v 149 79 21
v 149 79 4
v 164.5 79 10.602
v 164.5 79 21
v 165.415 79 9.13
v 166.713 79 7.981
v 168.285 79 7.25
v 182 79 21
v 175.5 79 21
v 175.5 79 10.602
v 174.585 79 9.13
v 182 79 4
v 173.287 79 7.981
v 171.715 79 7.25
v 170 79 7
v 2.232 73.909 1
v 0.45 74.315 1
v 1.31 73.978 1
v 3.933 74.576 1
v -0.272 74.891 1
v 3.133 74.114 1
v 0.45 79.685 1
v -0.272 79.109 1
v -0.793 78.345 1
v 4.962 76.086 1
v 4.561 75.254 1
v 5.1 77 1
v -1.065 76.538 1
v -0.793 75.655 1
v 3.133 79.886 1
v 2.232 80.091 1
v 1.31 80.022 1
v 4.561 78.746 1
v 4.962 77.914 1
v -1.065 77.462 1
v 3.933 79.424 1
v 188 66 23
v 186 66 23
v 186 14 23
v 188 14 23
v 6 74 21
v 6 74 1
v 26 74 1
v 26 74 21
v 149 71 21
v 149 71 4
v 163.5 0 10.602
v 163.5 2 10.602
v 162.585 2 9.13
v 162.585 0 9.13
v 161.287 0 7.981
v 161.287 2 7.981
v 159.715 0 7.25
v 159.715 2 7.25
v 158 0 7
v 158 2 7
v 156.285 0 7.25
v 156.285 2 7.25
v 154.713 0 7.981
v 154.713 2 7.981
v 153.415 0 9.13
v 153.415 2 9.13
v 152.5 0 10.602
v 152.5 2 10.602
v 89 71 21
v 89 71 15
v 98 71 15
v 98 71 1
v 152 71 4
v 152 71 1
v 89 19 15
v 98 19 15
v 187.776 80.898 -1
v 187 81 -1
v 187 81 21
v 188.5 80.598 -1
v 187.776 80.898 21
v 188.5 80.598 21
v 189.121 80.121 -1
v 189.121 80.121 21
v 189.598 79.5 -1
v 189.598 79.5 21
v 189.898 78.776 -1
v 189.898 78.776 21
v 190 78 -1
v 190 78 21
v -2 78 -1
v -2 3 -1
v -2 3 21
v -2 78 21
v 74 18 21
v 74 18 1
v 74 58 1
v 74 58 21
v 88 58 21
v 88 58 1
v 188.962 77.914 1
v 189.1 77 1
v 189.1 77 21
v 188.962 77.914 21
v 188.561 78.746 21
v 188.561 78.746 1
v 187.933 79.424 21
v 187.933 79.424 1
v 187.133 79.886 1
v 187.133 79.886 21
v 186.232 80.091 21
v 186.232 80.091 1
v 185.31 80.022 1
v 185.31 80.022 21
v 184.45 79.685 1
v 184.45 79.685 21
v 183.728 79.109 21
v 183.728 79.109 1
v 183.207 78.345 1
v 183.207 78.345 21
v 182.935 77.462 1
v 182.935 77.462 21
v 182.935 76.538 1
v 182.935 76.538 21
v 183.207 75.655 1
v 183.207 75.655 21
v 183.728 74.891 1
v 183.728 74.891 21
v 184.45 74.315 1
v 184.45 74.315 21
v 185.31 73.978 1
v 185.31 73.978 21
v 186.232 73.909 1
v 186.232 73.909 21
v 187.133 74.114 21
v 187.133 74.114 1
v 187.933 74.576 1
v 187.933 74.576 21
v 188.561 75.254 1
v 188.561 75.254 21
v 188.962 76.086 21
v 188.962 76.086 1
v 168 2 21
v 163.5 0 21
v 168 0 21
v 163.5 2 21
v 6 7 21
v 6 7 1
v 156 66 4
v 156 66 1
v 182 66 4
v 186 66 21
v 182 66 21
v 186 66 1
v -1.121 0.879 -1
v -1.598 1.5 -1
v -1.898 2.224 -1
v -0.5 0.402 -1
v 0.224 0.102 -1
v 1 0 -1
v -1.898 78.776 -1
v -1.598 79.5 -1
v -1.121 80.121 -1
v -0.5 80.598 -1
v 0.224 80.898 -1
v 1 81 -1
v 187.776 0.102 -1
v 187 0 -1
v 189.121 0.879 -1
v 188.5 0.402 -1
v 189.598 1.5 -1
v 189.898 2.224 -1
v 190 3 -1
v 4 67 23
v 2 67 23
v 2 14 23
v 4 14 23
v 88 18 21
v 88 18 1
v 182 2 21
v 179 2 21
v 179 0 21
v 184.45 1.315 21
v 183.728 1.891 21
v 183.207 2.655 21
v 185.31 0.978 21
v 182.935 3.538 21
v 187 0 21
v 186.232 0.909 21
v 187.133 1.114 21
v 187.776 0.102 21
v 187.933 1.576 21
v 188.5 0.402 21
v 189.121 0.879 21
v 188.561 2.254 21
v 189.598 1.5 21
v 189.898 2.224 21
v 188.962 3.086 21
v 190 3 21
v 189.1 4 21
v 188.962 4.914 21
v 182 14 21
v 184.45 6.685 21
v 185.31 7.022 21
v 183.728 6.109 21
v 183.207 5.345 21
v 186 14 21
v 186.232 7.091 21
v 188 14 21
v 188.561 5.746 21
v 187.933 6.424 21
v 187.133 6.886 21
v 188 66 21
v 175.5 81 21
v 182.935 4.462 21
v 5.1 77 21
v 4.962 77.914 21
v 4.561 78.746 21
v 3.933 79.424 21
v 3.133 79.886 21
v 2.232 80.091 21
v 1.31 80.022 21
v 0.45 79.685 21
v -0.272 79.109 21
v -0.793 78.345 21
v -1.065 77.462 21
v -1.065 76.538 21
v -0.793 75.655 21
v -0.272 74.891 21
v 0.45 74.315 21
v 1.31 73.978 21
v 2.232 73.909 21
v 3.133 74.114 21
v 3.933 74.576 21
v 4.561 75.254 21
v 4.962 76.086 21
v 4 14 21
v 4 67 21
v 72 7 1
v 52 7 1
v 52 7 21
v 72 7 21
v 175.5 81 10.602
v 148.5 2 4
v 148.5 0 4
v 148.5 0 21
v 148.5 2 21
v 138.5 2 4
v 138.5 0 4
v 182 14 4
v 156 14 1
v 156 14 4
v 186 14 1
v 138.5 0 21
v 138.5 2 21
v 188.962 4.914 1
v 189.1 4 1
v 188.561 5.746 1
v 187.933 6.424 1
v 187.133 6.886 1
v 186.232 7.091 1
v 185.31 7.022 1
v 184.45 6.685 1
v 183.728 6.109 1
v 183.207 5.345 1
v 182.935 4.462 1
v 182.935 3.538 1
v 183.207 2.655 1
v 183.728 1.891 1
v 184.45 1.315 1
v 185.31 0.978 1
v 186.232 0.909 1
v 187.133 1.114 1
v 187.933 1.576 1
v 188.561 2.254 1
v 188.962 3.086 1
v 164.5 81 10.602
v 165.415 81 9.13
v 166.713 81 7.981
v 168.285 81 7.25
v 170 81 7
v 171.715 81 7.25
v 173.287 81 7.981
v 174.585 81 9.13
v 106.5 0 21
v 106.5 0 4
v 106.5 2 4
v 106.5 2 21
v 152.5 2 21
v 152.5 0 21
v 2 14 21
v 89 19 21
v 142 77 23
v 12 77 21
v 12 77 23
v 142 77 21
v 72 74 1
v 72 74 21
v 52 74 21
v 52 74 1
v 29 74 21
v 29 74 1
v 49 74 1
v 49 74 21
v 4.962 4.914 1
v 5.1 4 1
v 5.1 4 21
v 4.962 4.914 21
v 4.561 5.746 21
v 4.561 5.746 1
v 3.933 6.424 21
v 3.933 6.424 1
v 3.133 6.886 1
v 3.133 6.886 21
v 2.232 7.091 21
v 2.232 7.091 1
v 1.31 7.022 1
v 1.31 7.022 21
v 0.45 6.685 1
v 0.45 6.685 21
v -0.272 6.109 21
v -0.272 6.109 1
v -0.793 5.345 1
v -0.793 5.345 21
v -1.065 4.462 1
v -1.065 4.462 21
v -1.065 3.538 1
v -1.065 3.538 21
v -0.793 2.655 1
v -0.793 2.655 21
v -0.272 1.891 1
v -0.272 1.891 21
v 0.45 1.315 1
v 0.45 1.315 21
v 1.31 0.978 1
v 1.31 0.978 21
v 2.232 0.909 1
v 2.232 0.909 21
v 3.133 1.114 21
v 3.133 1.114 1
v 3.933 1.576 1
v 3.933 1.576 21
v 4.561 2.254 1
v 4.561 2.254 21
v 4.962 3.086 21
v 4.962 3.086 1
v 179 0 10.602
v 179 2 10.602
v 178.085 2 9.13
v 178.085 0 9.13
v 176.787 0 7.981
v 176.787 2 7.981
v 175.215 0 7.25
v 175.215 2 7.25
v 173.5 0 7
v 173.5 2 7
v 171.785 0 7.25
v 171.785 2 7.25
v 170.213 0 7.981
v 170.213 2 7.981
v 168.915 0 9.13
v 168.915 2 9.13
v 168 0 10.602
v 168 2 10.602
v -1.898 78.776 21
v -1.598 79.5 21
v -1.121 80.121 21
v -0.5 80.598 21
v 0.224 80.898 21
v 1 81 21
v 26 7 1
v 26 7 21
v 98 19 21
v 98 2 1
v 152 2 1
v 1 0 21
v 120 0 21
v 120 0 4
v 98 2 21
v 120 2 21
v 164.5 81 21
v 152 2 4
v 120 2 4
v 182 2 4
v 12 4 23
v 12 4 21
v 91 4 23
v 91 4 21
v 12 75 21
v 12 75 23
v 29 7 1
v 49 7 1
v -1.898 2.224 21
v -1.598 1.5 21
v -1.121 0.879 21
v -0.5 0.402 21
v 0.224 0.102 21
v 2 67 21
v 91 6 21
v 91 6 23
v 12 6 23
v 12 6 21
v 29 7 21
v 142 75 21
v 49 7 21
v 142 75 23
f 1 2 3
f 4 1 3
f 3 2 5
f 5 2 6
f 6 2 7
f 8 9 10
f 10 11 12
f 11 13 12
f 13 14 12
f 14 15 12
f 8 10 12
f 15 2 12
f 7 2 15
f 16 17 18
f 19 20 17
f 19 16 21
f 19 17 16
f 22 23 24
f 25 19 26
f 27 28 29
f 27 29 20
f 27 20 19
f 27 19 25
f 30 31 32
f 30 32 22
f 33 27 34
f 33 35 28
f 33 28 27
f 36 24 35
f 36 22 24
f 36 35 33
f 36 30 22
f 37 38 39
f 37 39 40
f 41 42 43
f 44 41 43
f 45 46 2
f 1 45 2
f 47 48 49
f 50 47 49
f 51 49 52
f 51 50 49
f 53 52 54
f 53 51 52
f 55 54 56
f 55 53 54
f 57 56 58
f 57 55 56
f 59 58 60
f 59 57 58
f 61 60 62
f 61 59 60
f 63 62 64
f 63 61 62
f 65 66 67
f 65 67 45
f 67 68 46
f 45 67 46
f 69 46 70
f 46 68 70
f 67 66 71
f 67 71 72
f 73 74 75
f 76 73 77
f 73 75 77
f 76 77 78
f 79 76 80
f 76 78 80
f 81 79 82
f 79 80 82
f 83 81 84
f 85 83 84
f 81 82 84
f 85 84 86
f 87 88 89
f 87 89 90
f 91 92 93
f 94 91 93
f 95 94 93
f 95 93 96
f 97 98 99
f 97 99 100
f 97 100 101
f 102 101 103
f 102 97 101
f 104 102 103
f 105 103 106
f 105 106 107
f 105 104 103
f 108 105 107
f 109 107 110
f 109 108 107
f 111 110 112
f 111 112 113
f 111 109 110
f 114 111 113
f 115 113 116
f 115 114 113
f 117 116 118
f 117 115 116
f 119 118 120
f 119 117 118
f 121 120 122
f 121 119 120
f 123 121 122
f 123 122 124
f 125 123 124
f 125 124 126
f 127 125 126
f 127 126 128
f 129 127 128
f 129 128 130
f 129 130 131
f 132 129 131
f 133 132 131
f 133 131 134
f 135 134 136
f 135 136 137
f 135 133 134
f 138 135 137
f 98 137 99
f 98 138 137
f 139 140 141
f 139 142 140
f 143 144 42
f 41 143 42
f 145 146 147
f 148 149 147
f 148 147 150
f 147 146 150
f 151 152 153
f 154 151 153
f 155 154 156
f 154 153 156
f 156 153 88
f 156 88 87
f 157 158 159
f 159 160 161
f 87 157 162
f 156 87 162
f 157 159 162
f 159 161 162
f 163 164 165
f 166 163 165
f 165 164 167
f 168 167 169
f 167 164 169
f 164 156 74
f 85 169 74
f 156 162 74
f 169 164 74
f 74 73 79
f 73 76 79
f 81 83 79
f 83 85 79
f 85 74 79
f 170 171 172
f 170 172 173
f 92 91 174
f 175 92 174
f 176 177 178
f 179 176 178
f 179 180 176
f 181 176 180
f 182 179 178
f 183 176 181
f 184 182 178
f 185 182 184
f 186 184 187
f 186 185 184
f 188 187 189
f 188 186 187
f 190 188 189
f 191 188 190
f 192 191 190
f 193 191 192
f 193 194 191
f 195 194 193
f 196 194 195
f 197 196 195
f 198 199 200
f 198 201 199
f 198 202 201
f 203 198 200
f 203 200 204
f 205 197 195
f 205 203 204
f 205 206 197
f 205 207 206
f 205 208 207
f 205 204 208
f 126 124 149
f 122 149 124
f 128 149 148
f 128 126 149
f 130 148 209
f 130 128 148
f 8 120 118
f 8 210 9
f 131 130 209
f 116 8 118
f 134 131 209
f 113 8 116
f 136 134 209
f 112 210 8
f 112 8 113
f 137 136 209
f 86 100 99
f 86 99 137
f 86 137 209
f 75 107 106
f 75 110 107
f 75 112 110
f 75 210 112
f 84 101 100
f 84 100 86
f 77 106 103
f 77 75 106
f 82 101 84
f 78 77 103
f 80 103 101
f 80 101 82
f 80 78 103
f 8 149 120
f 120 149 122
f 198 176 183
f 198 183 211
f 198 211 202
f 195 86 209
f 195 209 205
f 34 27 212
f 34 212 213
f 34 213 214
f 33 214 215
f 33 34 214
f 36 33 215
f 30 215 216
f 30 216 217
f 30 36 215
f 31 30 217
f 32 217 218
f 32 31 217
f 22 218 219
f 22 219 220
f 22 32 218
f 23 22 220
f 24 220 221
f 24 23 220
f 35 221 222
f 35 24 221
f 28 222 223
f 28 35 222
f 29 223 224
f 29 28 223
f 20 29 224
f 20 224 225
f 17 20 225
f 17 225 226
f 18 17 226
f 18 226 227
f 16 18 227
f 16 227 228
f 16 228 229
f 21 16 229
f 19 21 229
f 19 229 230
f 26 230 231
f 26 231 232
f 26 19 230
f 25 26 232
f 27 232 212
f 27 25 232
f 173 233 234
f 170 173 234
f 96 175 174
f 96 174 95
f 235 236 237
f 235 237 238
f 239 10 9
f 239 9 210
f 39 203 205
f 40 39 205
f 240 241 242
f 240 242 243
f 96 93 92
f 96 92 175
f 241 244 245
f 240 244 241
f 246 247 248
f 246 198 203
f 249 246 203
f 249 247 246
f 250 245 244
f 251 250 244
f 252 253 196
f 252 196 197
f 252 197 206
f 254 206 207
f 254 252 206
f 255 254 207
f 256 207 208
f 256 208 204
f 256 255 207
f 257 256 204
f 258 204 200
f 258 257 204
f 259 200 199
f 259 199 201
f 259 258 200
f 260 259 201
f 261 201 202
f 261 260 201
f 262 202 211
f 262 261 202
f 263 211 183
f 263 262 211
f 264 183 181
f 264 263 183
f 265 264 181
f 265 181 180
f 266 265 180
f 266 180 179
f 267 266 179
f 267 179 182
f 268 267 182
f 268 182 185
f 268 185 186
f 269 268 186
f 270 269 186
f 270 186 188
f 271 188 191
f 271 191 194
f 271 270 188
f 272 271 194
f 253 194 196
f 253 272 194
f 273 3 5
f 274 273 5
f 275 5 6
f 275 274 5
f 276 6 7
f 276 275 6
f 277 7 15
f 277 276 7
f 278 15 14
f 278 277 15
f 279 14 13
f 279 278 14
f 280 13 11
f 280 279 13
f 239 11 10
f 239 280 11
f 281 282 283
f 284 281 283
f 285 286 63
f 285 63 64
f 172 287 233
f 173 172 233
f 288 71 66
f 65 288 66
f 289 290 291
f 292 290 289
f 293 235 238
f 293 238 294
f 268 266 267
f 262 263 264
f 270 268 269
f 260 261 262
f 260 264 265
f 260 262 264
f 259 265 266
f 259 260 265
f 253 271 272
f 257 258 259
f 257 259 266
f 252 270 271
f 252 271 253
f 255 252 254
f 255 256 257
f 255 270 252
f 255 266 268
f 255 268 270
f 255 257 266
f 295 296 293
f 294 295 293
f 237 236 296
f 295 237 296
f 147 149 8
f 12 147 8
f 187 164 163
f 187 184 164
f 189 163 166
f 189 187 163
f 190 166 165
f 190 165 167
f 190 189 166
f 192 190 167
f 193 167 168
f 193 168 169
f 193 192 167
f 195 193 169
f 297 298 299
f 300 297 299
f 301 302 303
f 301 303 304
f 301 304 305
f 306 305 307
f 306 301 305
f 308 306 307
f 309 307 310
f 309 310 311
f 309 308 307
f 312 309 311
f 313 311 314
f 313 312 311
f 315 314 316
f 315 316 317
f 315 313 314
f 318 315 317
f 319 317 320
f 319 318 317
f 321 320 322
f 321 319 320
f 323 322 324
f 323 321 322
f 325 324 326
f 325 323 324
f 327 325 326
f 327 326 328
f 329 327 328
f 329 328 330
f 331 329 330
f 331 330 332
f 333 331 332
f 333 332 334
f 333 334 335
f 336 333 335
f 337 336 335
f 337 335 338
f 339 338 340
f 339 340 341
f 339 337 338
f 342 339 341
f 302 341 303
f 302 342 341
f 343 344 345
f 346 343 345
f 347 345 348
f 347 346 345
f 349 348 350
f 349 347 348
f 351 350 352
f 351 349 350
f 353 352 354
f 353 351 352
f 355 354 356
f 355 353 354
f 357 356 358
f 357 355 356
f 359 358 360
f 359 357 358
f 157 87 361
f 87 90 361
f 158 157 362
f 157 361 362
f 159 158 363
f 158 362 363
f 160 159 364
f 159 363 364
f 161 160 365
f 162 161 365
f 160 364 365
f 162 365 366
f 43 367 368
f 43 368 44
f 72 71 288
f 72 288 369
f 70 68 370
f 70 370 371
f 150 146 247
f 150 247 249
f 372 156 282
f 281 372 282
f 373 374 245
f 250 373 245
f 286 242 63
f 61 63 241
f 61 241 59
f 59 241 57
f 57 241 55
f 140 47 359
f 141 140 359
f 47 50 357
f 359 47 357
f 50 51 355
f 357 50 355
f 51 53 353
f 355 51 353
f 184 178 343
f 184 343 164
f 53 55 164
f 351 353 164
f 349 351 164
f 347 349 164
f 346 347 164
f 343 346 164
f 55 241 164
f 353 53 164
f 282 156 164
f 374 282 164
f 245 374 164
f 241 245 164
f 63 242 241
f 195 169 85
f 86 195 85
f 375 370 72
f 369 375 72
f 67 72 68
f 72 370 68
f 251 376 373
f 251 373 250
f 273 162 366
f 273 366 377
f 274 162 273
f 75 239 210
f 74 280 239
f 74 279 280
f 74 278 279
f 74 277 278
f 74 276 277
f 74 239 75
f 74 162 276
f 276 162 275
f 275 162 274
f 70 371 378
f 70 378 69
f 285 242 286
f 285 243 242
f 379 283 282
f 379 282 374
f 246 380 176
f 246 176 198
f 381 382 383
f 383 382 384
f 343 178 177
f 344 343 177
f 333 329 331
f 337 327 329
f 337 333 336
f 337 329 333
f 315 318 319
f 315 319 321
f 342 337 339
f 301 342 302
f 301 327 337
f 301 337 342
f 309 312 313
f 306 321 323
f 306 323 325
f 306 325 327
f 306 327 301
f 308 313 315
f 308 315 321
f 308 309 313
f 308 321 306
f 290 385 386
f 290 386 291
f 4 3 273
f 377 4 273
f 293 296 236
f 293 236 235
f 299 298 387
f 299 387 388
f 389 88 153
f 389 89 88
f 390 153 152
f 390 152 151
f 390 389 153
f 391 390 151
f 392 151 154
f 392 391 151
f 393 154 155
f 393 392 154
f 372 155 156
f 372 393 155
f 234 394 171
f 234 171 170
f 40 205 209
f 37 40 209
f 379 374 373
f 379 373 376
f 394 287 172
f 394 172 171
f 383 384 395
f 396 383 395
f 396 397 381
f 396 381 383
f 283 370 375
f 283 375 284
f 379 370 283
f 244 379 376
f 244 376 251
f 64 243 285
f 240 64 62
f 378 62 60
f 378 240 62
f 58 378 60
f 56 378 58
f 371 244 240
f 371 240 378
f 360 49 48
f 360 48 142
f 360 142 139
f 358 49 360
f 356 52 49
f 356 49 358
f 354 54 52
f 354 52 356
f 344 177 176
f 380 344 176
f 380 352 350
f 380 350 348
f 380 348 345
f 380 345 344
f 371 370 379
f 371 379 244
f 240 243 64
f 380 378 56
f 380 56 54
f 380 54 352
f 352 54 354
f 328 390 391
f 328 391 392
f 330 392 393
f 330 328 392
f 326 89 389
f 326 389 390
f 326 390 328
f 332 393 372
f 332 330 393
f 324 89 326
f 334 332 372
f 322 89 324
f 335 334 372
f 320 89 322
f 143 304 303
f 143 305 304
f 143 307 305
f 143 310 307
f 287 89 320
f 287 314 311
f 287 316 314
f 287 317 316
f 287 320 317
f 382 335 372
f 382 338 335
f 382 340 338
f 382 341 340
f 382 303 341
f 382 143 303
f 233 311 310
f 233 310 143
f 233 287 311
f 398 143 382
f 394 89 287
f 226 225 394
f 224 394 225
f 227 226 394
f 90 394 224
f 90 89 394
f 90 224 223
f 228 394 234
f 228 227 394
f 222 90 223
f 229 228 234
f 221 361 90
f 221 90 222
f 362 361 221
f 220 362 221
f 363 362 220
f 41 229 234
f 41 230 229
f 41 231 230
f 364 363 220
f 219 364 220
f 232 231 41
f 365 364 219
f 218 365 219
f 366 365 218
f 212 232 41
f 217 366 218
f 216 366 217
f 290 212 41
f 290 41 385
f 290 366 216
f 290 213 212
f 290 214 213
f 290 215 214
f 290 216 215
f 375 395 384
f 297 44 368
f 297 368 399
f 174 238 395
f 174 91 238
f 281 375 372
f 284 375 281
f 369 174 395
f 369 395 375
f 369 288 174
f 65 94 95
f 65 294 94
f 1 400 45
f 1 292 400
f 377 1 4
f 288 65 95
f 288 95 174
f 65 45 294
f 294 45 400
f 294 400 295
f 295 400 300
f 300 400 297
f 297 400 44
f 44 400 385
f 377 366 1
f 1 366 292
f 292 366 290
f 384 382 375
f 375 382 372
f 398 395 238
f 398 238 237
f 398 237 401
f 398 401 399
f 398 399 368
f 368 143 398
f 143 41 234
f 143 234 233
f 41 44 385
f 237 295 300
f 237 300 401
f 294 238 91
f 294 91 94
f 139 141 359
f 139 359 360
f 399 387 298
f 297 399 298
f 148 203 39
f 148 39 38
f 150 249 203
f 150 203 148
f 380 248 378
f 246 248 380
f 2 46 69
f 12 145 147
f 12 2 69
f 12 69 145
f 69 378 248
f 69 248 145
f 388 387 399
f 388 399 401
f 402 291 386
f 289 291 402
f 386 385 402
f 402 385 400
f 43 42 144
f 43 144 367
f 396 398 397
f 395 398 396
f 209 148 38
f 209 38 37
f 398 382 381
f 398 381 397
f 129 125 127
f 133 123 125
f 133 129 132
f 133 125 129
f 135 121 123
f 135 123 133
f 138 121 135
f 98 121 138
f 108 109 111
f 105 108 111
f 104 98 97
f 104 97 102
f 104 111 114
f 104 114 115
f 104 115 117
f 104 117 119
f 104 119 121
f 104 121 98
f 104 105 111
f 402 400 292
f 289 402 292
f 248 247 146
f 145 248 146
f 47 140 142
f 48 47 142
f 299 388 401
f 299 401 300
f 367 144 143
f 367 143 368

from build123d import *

# Parameters (mm, degrees)
BOX024_W                  = 130
BOX024_H                  = 2
BOX024_DEPTH              = 2
BOX025_W                  = 79
BOX025_H                  = 2
BOX025_DEPTH              = 2
BOX026_W                  = 2
BOX026_H                  = 52
BOX026_DEPTH              = 2
BOX023_W                  = 2
BOX023_H                  = 53
BOX023_DEPTH              = 2
BOX018_W                  = 0.5
BOX018_H                  = 2
BOX018_DEPTH              = 12
BOX019_W                  = 0.5
BOX019_H                  = 2
BOX019_DEPTH              = 12
BOX020_W                  = 0.5
BOX020_H                  = 2
BOX020_DEPTH              = 12
BOX021_W                  = 0.5
BOX021_H                  = 2
BOX021_DEPTH              = 12
BOX022_W                  = 0.5
BOX022_H                  = 2
BOX022_DEPTH              = 12
BOX017_W                  = 0.5
BOX017_H                  = 2
BOX017_DEPTH              = 12
BOX015_W                  = 12
BOX015_H                  = 10
BOX015_DEPTH              = 20
BOX016_W                  = 12
BOX016_H                  = 10
BOX016_DEPTH              = 20
BOX014_W                  = 12
BOX014_H                  = 10
BOX014_DEPTH              = 20
CYLINDER016_R             = 7
CYLINDER016_DEPTH         = 1.5
CYLINDER015_R             = 6
CYLINDER015_DEPTH         = 18
FUSION006_PLACEMENT_ANGLE = 90
CYLINDER018_R             = 7
CYLINDER018_DEPTH         = 1.5
CYLINDER017_R             = 6
CYLINDER017_DEPTH         = 18
FUSION007_PLACEMENT_ANGLE = 90
CYLINDER014_R             = 7
CYLINDER014_DEPTH         = 1.5
CYLINDER013_R             = 6
CYLINDER013_DEPTH         = 18
FUSION005_PLACEMENT_ANGLE = 90
BOX013_W                  = 33
BOX013_H                  = 77
BOX013_DEPTH              = 17
BOX012_W                  = 10
BOX012_H                  = 11
BOX012_DEPTH              = 21
BOX011_W                  = 13.5
BOX011_H                  = 11
BOX011_DEPTH              = 21
CYLINDER010_R             = 3.1
CYLINDER010_DEPTH         = 20
CYLINDER011_R             = 3.1
CYLINDER011_DEPTH         = 20
CYLINDER012_R             = 3.1
CYLINDER012_DEPTH         = 20
BOX004_W                  = 20
BOX004_H                  = 67
BOX004_DEPTH              = 20
BOX005_W                  = 20
BOX005_H                  = 67
BOX005_DEPTH              = 20
BOX006_W                  = 20
BOX006_H                  = 67
BOX006_DEPTH              = 20
BOX007_W                  = 14
BOX007_H                  = 40
BOX007_DEPTH              = 20
BOX008_W                  = 54
BOX008_H                  = 69
BOX008_DEPTH              = 20
BOX009_W                  = 30
BOX009_H                  = 52
BOX009_DEPTH              = 20
BOX010_W                  = 72
BOX010_H                  = 52
BOX010_DEPTH              = 6
CYLINDER009_R             = 3.1
CYLINDER009_DEPTH         = 20
BOX_W                     = 192
BOX_H                     = 81
BOX_DEPTH                 = 22
FILLET_R                  = 3


with BuildPart() as cube011:
    # Box024 → Box024 (new body)
    with BuildSketch(Plane(origin=(12, 75, 21), x_dir=(1, 0, 0), z_dir=(0, 0, 1))):
        with Locations((65, 1)):
            Rectangle(BOX024_W, BOX024_H)
    extrude(amount=BOX024_DEPTH)


with BuildPart() as cube012:
    # Box025 → Box025 (new body)
    with BuildSketch(Plane(origin=(12, 4, 21), x_dir=(1, 0, 0), z_dir=(0, 0, 1))):
        with Locations((39.5, 1)):
            Rectangle(BOX025_W, BOX025_H)
    extrude(amount=BOX025_DEPTH)


with BuildPart() as cube013:
    # Box026 → Box026 (new body)
    with BuildSketch(Plane(origin=(186, 14, 21), x_dir=(1, 0, 0), z_dir=(0, 0, 1))):
        with Locations((1, 26)):
            Rectangle(BOX026_W, BOX026_H)
    extrude(amount=BOX026_DEPTH)


with BuildPart() as latches:
    # Box023 → Box023 (new body)
    with BuildSketch(Plane(origin=(2, 14, 21), x_dir=(1, 0, 0), z_dir=(0, 0, 1))):
        with Locations((1, 26.5)):
            Rectangle(BOX023_W, BOX023_H)
    extrude(amount=BOX023_DEPTH)

    # Compound: union Cube011, Cube012, Cube013
    add(cube011.part)
    add(cube012.part)
    add(cube013.part)


with BuildPart() as cube005:
    # Box018 → Box018 (new body)
    with BuildSketch(Plane(origin=(163.5, 0, 9), x_dir=(1, 0, 0), z_dir=(0, 0, 1))):
        with Locations((0.25, 1)):
            Rectangle(BOX018_W, BOX018_H)
    extrude(amount=BOX018_DEPTH)


with BuildPart() as cube006:
    # Box019 → Box019 (new body)
    with BuildSketch(Plane(origin=(167.5, 0, 9), x_dir=(1, 0, 0), z_dir=(0, 0, 1))):
        with Locations((0.25, 1)):
            Rectangle(BOX019_W, BOX019_H)
    extrude(amount=BOX019_DEPTH)


with BuildPart() as cube007:
    # Box020 → Box020 (new body)
    with BuildSketch(Plane(origin=(179, 0, 9), x_dir=(1, 0, 0), z_dir=(0, 0, 1))):
        with Locations((0.25, 1)):
            Rectangle(BOX020_W, BOX020_H)
    extrude(amount=BOX020_DEPTH)


with BuildPart() as cube008:
    # Box021 → Box021 (new body)
    with BuildSketch(Plane(origin=(175.5, 79, 9), x_dir=(1, 0, 0), z_dir=(0, 0, 1))):
        with Locations((0.25, 1)):
            Rectangle(BOX021_W, BOX021_H)
    extrude(amount=BOX021_DEPTH)


with BuildPart() as cube009:
    # Box022 → Box022 (new body)
    with BuildSketch(Plane(origin=(164, 79, 9), x_dir=(1, 0, 0), z_dir=(0, 0, 1))):
        with Locations((0.25, 1)):
            Rectangle(BOX022_W, BOX022_H)
    extrude(amount=BOX022_DEPTH)


with BuildPart() as narrowingdcjackmounts:
    # Box017 → Box017 (new body)
    with BuildSketch(Plane(origin=(152, 0, 9), x_dir=(1, 0, 0), z_dir=(0, 0, 1))):
        with Locations((0.25, 1)):
            Rectangle(BOX017_W, BOX017_H)
    extrude(amount=BOX017_DEPTH)

    # Fusion010: union Cube005, Cube006, Cube007, Cube008, Cube009
    add(cube005.part)
    add(cube006.part)
    add(cube007.part)
    add(cube008.part)
    add(cube009.part)


with BuildPart() as cube002:
    # Box015 → Box015 (new body)
    with BuildSketch(Plane(origin=(167.5, 0, 13), x_dir=(1, 0, 0), z_dir=(0, 0, 1))):
        with Locations((6, 5)):
            Rectangle(BOX015_W, BOX015_H)
    extrude(amount=BOX015_DEPTH)


with BuildPart() as cube003:
    # Box016 → Box016 (new body)
    with BuildSketch(Plane(origin=(164, 71, 13), x_dir=(1, 0, 0), z_dir=(0, 0, 1))):
        with Locations((6, 5)):
            Rectangle(BOX016_W, BOX016_H)
    extrude(amount=BOX016_DEPTH)


with BuildPart() as fusion009:
    # Box014 → Box014 (new body)
    with BuildSketch(Plane(origin=(152, 0, 13), x_dir=(1, 0, 0), z_dir=(0, 0, 1))):
        with Locations((6, 5)):
            Rectangle(BOX014_W, BOX014_H)
    extrude(amount=BOX014_DEPTH)

    # Fusion009: union Cube002, Cube003
    add(cube002.part)
    add(cube003.part)


with BuildPart() as cylinder016:
    # Cylinder016 → Cylinder016 (new body)
    with BuildSketch(Plane.XY):
        Circle(CYLINDER016_R)
    extrude(amount=CYLINDER016_DEPTH)


with BuildPart() as fusion006:
    # Cylinder015 → Cylinder015 (new body)
    with BuildSketch(Plane.XY):
        Circle(CYLINDER015_R)
    extrude(amount=CYLINDER015_DEPTH)

    # Fusion006: union Cylinder016
    add(cylinder016.part)


with BuildPart() as fusion006_1:
    # Fusion006 placement: moved
    add(fusion006.part.moved(Location((158, -2, 13))).rotate(Axis((158, -2, 13), (-1, 0, 0)), FUSION006_PLACEMENT_ANGLE))


with BuildPart() as cylinder018:
    # Cylinder018 → Cylinder018 (new body)
    with BuildSketch(Plane.XY):
        Circle(CYLINDER018_R)
    extrude(amount=CYLINDER018_DEPTH)


with BuildPart() as fusion007:
    # Cylinder017 → Cylinder017 (new body)
    with BuildSketch(Plane.XY):
        Circle(CYLINDER017_R)
    extrude(amount=CYLINDER017_DEPTH)

    # Fusion007: union Cylinder018
    add(cylinder018.part)


with BuildPart() as fusion007_1:
    # Fusion007 placement: moved
    add(fusion007.part.moved(Location((170, 82.5, 13))).rotate(Axis((170, 82.5, 13), (1, 0, 0)), FUSION007_PLACEMENT_ANGLE))


with BuildPart() as cylinder014:
    # Cylinder014 → Cylinder014 (new body)
    with BuildSketch(Plane.XY):
        Circle(CYLINDER014_R)
    extrude(amount=CYLINDER014_DEPTH)


with BuildPart() as dc_jack_holes:
    # Cylinder013 → Cylinder013 (new body)
    with BuildSketch(Plane.XY):
        Circle(CYLINDER013_R)
    extrude(amount=CYLINDER013_DEPTH)

    # Fusion005: union Cylinder014
    add(cylinder014.part)


with BuildPart() as dc_jack_holes_1:
    # Fusion005 placement: moved
    add(dc_jack_holes.part.moved(Location((173.5, -2, 13))).rotate(Axis((173.5, -2, 13), (-1, 0, 0)), FUSION005_PLACEMENT_ANGLE))

    # Fusion008: union Fusion006, Fusion007
    add(fusion006_1.part)
    add(fusion007_1.part)


with BuildPart() as cube:
    # Box013 → Box013 (new body)
    with BuildSketch(Plane(origin=(149, 2, 4), x_dir=(1, 0, 0), z_dir=(0, 0, 1))):
        with Locations((16.5, 38.5)):
            Rectangle(BOX013_W, BOX013_H)
    extrude(amount=BOX013_DEPTH)


with BuildPart() as arduion_dc_in_hole:
    # Box012 → Box012 (new body)
    with BuildSketch(Plane(origin=(138.5, -1, 4), x_dir=(1, 0, 0), z_dir=(0, 0, 1))):
        with Locations((5, 5.5)):
            Rectangle(BOX012_W, BOX012_H)
    extrude(amount=BOX012_DEPTH)


with BuildPart() as arduino_jacks_holes:
    # Box011 → Box011 (new body)
    with BuildSketch(Plane(origin=(106.5, -1, 4), x_dir=(1, 0, 0), z_dir=(0, 0, 1))):
        with Locations((6.75, 5.5)):
            Rectangle(BOX011_W, BOX011_H)
    extrude(amount=BOX011_DEPTH)

    # Fusion004: union Arduion DC-IN Hole
    add(arduion_dc_in_hole.part)


with BuildPart() as m4_mounting_hole001:
    # Cylinder010 → Cylinder010 (new body)
    with BuildSketch(Plane(origin=(2, 77, 1), x_dir=(1, 0, 0), z_dir=(0, 0, 1))):
        Circle(CYLINDER010_R)
    extrude(amount=CYLINDER010_DEPTH)


with BuildPart() as m4_mounting_hole002:
    # Cylinder011 → Cylinder011 (new body)
    with BuildSketch(Plane(origin=(186, 77, 1), x_dir=(1, 0, 0), z_dir=(0, 0, 1))):
        Circle(CYLINDER011_R)
    extrude(amount=CYLINDER011_DEPTH)


with BuildPart() as m4_mounting_hole003:
    # Cylinder012 → Cylinder012 (new body)
    with BuildSketch(Plane(origin=(186, 4, 1), x_dir=(1, 0, 0), z_dir=(0, 0, 1))):
        Circle(CYLINDER012_R)
    extrude(amount=CYLINDER012_DEPTH)


with BuildPart() as f_18650_mnt_place:
    # Box004 → Box004 (new body)
    with BuildSketch(Plane(origin=(6, 7, 1), x_dir=(1, 0, 0), z_dir=(0, 0, 1))):
        with Locations((10, 33.5)):
            Rectangle(BOX004_W, BOX004_H)
    extrude(amount=BOX004_DEPTH)


with BuildPart() as f_18650_mnt_place001:
    # Box005 → Box005 (new body)
    with BuildSketch(Plane(origin=(29, 7, 1), x_dir=(1, 0, 0), z_dir=(0, 0, 1))):
        with Locations((10, 33.5)):
            Rectangle(BOX005_W, BOX005_H)
    extrude(amount=BOX005_DEPTH)


with BuildPart() as f_18650_mnt_place002:
    # Box006 → Box006 (new body)
    with BuildSketch(Plane(origin=(52, 7, 1), x_dir=(1, 0, 0), z_dir=(0, 0, 1))):
        with Locations((10, 33.5)):
            Rectangle(BOX006_W, BOX006_H)
    extrude(amount=BOX006_DEPTH)


with BuildPart() as current_sensor_mnt_place:
    # Box007 → Box007 (new body)
    with BuildSketch(Plane(origin=(74, 18, 1), x_dir=(1, 0, 0), z_dir=(0, 0, 1))):
        with Locations((7, 20)):
            Rectangle(BOX007_W, BOX007_H)
    extrude(amount=BOX007_DEPTH)


with BuildPart() as arduino_mnt_place:
    # Box008 → Box008 (new body)
    with BuildSketch(Plane(origin=(98, 2, 1), x_dir=(1, 0, 0), z_dir=(0, 0, 1))):
        with Locations((27, 34.5)):
            Rectangle(BOX008_W, BOX008_H)
    extrude(amount=BOX008_DEPTH)


with BuildPart() as dc_dc_step_up_mnt_place:
    # Box009 → Box009 (new body)
    with BuildSketch(Plane(origin=(156, 14, 1), x_dir=(1, 0, 0), z_dir=(0, 0, 1))):
        with Locations((15, 26)):
            Rectangle(BOX009_W, BOX009_H)
    extrude(amount=BOX009_DEPTH)


with BuildPart() as main_board_mnt_place:
    # Box010 → Box010 (new body)
    with BuildSketch(Plane(origin=(89, 19, 15), x_dir=(1, 0, 0), z_dir=(0, 0, 1))):
        with Locations((36, 26)):
            Rectangle(BOX010_W, BOX010_H)
    extrude(amount=BOX010_DEPTH)


with BuildPart() as inner_mnt_holes:
    # Cylinder009 → Cylinder009 (new body)
    with BuildSketch(Plane(origin=(2, 4, 1), x_dir=(1, 0, 0), z_dir=(0, 0, 1))):
        Circle(CYLINDER009_R)
    extrude(amount=CYLINDER009_DEPTH)

    # Fusion003: union M4 Mounting Hole001, M4 Mounting Hole002, M4 Mounting Hole003, 18650 MNT PLACE, 18650 MNT PLACE001, 18650 MNT PLACE002, Current Sensor MNT Place, Arduino MNT Place, DC-DC Step Up MNT Place, Main Board MNT Place
    add(m4_mounting_hole001.part)
    add(m4_mounting_hole002.part)
    add(m4_mounting_hole003.part)
    add(f_18650_mnt_place.part)
    add(f_18650_mnt_place001.part)
    add(f_18650_mnt_place002.part)
    add(current_sensor_mnt_place.part)
    add(arduino_mnt_place.part)
    add(dc_dc_step_up_mnt_place.part)
    add(main_board_mnt_place.part)


with BuildPart() as body:
    # Box → Box (new body)
    with BuildSketch(Plane(origin=(-2, 0, -1), x_dir=(1, 0, 0), z_dir=(0, 0, 1))):
        with Locations((96, 40.5)):
            Rectangle(BOX_W, BOX_H)
    extrude(amount=BOX_DEPTH)

    # Cut: cut Inner MNT Holes
    add(inner_mnt_holes.part, mode=Mode.SUBTRACT)

    # Cut001: cut Arduino Jacks Holes
    add(arduino_jacks_holes.part, mode=Mode.SUBTRACT)

    # Cut002: cut Cube
    add(cube.part, mode=Mode.SUBTRACT)

    # Cut003: cut DC_Jack_Holes
    add(dc_jack_holes_1.part, mode=Mode.SUBTRACT)

    # Cut004: cut Fusion009
    add(fusion009.part, mode=Mode.SUBTRACT)

    # Fillet
    fillet_edges = [body.edges().sort_by_distance(p)[0] for p in [
        (-2, 0, 10),
        (-2, 81, 10),
        (190, 0, 10),
        (190, 81, 10),
    ]]
    fillet(fillet_edges, radius=FILLET_R)

    # Fusion011: union NarrowingDCJackMounts
    add(narrowingdcjackmounts.part)

    # Fusion012: union Latches
    add(latches.part)


solid = body.part
